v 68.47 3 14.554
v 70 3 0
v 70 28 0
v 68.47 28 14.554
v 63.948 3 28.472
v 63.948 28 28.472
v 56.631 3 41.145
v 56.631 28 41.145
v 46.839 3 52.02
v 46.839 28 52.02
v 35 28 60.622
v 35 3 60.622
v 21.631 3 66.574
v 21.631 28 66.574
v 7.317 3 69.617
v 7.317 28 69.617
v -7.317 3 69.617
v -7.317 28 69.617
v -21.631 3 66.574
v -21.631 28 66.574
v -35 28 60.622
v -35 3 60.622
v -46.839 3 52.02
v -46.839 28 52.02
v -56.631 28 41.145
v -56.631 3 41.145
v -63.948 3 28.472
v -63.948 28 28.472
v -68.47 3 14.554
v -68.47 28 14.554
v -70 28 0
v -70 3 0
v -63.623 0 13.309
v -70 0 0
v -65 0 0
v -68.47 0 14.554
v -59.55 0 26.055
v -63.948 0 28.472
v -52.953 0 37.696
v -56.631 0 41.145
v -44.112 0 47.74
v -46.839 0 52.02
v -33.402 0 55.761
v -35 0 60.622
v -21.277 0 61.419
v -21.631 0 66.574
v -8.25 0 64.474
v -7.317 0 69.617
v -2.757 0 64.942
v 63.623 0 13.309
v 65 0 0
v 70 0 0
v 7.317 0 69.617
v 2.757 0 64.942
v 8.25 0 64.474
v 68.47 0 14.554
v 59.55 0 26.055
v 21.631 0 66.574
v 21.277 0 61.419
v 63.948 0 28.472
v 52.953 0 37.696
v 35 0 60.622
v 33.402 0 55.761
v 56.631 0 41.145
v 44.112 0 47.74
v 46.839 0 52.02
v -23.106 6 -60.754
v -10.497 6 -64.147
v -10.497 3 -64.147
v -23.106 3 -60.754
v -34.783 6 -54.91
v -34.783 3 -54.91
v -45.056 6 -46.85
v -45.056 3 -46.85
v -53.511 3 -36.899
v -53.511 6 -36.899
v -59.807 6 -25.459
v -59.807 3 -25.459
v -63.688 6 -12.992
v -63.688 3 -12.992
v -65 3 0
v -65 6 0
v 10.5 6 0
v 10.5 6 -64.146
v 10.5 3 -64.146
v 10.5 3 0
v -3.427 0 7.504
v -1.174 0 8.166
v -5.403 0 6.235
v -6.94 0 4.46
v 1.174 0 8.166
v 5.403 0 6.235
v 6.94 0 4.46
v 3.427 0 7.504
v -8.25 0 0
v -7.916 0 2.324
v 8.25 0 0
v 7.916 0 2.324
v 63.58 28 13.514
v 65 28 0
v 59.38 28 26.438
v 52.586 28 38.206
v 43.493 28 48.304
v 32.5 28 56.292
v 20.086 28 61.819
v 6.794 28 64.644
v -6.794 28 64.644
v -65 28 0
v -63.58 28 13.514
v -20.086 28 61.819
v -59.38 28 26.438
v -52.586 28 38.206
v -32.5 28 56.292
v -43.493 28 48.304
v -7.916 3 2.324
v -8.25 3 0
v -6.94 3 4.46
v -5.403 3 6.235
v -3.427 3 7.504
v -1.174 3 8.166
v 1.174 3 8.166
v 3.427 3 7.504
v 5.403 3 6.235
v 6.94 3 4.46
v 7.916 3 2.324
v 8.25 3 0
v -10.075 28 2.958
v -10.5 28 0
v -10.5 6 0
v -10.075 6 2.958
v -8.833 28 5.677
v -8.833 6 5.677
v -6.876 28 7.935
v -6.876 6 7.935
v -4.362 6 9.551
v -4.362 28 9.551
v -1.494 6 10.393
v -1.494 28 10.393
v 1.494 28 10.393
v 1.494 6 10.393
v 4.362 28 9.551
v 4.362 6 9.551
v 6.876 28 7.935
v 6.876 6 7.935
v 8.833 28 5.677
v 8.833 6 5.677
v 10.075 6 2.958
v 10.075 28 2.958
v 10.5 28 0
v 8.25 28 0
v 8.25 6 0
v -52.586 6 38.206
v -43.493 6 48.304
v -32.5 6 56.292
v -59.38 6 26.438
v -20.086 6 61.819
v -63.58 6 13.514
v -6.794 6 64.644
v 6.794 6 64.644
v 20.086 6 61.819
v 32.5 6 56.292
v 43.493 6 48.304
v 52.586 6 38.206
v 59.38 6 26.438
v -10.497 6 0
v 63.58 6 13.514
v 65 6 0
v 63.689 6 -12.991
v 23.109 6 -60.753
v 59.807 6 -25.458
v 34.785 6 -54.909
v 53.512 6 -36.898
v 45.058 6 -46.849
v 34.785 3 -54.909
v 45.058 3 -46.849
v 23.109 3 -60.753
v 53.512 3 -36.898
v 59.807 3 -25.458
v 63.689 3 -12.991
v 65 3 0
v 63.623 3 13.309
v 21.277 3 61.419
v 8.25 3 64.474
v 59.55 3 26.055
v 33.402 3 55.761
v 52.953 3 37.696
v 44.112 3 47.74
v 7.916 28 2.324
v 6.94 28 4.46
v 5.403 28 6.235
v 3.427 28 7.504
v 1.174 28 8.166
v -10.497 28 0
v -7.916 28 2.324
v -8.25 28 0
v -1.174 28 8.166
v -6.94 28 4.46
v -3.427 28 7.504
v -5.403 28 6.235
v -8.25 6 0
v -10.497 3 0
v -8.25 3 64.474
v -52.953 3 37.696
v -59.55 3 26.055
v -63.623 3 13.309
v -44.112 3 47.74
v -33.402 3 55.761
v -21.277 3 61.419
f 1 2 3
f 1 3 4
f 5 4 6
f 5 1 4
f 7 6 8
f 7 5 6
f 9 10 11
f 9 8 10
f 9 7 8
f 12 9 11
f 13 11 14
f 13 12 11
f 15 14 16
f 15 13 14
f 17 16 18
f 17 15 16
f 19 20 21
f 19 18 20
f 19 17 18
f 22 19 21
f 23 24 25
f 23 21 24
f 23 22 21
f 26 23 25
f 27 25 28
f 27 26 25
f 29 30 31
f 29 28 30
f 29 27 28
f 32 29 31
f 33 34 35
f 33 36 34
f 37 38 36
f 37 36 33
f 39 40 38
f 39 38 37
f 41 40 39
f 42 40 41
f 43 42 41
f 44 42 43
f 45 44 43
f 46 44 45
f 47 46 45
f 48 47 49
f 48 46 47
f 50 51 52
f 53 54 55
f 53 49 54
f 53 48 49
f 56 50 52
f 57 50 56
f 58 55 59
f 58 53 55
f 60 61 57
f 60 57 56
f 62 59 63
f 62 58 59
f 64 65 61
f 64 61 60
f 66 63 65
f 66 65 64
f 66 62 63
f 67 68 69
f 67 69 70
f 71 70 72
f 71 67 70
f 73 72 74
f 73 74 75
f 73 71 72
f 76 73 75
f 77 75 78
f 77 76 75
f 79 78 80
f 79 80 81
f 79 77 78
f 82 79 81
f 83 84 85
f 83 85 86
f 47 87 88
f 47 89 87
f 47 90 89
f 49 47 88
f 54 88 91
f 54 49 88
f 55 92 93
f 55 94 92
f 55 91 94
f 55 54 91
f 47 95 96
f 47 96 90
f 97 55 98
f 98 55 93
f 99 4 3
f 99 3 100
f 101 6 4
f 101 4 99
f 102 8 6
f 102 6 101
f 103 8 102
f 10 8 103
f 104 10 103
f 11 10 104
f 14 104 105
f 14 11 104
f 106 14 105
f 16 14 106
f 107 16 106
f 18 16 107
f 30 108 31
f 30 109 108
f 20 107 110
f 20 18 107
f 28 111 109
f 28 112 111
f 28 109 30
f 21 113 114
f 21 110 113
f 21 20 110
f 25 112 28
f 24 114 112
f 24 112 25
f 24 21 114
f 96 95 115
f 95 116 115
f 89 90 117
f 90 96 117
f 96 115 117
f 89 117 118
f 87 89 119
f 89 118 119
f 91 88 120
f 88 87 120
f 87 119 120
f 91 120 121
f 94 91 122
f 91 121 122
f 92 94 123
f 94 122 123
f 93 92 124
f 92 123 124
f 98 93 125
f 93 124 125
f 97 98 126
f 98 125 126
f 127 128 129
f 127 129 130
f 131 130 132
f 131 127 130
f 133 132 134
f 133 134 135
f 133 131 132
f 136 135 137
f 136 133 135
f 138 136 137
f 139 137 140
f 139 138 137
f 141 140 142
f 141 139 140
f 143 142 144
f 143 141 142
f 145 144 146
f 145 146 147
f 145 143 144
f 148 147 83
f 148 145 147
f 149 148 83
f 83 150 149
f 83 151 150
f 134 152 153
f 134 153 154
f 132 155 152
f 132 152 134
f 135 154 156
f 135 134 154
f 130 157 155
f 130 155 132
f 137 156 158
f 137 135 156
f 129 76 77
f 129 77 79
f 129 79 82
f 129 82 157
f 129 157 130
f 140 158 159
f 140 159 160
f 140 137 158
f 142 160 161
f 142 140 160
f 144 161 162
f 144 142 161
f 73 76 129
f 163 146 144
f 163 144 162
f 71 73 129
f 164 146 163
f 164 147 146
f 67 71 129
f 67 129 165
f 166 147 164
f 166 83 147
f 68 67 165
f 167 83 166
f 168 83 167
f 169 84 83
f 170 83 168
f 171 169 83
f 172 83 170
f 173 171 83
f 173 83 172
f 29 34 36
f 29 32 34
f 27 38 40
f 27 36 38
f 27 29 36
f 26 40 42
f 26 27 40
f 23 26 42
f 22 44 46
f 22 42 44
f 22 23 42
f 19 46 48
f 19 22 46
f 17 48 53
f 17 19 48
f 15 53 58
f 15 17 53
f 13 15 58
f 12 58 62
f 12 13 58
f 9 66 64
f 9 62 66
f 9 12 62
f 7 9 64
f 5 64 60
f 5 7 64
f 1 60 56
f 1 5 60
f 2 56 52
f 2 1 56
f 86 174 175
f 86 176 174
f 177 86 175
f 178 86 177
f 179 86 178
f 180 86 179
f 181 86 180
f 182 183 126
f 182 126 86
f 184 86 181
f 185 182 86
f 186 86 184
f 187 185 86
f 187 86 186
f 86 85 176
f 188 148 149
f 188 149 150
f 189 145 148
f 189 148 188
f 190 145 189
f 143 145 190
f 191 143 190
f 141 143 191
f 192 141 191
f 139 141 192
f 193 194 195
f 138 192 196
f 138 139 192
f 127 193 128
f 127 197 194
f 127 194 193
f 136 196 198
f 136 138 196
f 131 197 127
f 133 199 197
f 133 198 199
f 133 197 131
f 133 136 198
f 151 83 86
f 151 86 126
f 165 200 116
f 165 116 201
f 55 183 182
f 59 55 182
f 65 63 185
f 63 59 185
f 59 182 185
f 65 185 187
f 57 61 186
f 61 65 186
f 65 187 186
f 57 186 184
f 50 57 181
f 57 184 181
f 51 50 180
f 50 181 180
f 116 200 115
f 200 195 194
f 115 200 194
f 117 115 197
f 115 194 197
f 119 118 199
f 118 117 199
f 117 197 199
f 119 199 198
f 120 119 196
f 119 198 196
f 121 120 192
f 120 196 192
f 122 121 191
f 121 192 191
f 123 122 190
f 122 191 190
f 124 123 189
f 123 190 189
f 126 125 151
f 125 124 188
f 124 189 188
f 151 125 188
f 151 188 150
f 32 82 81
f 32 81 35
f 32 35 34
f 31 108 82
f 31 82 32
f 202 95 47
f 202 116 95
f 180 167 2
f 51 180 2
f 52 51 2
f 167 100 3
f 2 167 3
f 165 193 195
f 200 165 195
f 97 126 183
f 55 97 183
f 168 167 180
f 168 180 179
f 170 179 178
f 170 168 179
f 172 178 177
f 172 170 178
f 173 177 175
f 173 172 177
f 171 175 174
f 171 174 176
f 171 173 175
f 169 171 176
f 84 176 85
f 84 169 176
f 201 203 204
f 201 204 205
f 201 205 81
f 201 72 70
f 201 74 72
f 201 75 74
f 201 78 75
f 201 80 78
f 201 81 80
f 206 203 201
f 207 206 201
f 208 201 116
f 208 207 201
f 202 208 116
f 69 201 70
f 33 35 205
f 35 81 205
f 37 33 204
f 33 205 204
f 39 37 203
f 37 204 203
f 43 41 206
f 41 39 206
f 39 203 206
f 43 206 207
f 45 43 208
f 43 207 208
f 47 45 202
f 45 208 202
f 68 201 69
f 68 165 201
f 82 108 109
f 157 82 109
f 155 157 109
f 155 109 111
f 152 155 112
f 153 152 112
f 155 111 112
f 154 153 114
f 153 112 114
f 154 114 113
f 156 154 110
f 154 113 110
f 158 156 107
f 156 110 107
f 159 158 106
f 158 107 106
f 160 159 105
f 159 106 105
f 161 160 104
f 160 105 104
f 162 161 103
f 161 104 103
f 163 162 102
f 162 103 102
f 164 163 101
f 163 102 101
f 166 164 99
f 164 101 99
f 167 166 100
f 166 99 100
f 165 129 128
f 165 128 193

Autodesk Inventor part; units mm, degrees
ref_plane "YZ Plane" through (0, 0, 0) normal (1, 0, 0) x (0, 1, 0)
ref_plane "XZ Plane" through (0, 0, 0) normal (0, 1, 0) x (-1, 0, 0)
ref_plane "XY Plane" through (0, 0, 0) normal (0, 0, 1) x (1, 0, 0)
sketch "Sketch1" plane through (0, 0, 0) normal (0, 1, 0) x (-1, 0, 0)
  circle A0 centre (0, 0) radius 70
  dimension "d0" = 140
extrude "Extrusion1" add sketch "Sketch1" along normal blind 28
sketch "Sketch2" plane through (0, 28, 0) normal (0, 1, 0) x (1, 0, 0)
  circle A0 centre (0, 0) radius 8.25
  dimension "d3" = 16.5
extrude "Extrusion2" cut sketch "Sketch2" against normal blind 280
sketch "Sketch3" plane through (0, 28, 0) normal (0, 1, 0) x (1, 0, 0)
  circle A0 centre (0, 0) radius 8.25 projected
  circle A1 centre (0, 0) radius 65
  circle A2 centre (0, 0) radius 10.5
  dimension "d6" = 130
  dimension "d7" = 21
extrude "Extrusion3" cut sketch "Sketch3" against normal blind 22 contours A1
sketch "Sketch4" plane through (0, 6, 0) normal (0, 1, 0) x (1, 0, 0)
  line L0 (-77.4845, 0) -> (88.5537, 0)
  line L1 (88.5537, 0) -> (88.5537, 100.8261)
  line L2 (88.5537, 100.8261) -> (-77.4845, 100.8261)
  line L3 (-77.4845, 100.8261) -> (-77.4845, 0)
  point P0 (0, 0)
extrude "Extrusion4" cut sketch "Sketch4" along normal blind 220
sketch "Sketch5" plane through (0, 0, 0) normal (0, -1, 0) x (1, 0, 0)
  circle A0 centre (0, 0) radius 8.25 projected
  circle A1 centre (0, 0) radius 70
extrude "Extrusion5" cut sketch "Sketch5" against normal blind 3
sketch "Sketch6" plane through (0, 6, 0) normal (0, 1, 0) x (1, 0, 0)
  arc A0 (-65, 0) -> (65, 0) centre (0, 0) ccw projected
  line L0 (65, 0) -> (70, 0) projected
  arc A1 (70, 0) -> (-70, 0) centre (0, 0) ccw projected
  line L1 (-70, 0) -> (-65, 0) projected
  arc A2 (-10.5, 0) -> (10.5, 0) centre (0, 0) ccw projected
  line L2 (-10.5, 0) -> (-8.25, 0) projected
  arc A3 (8.25, 0) -> (-8.25, 0) centre (0, 0) ccw projected
  line L3 (8.25, 0) -> (10.5, 0) projected
  circle A4 centre (0, 0) radius 8.25 projected
  arc A5 (65, 0) -> (-65, 0) centre (0, 0) ccw
  line L4 (-65, 0) -> (-70, 0)
  line L5 (65, 0) -> (70, 0)
  arc A6 (70, 0) -> (-70, 0) centre (0, 0) ccw projected
  arc A7 (70, 0) -> (70, 0) centre (0, 0) ccw
extrude "Extrusion6" cut sketch "Sketch6" against normal blind 3 contours L1 A1 L0 A5
sketch "Sketch7" plane through (0, 3, 0) normal (0, -1, 0) x (1, 0, 0)
  point P0 (0, 0)
sketch "Sketch8" plane through (0, 3, 0) normal (0, -1, 0) x (1, 0, 0)
  arc A0 (65, 0) -> (-65, 0) centre (0, 0) ccw projected
  arc A1 (70, 0) -> (-70, 0) centre (0, 0) ccw projected
  arc A2 (70, 0) -> (-70, 0) centre (0, 0) ccw
  arc A3 (65, 0) -> (-65, 0) centre (0, 0) ccw
  line L0 (65, 0) -> (70, 0) projected
  line L1 (70, 0) -> (65, 0)
  line L2 (-65, 0) -> (-70, 0) projected
  line L3 (-65, 0) -> (-70, 0)
extrude "Extrusion7" add sketch "Sketch8" along normal blind 3
sketch "Sketch9" plane through (0, 28, 0) normal (0, 1, 0) x (1, 0, 0)
  line L0 (10.5, 0) -> (-10.497, 0)
  line L1 (-10.497, 0) -> (-10.497, 68.6752)
  line L2 (-10.497, 68.6752) -> (10.5, 68.6752)
  line L3 (10.5, 68.6752) -> (10.5, 0)
  point P0 (0, 0)
extrude "Extrusion8" cut sketch "Sketch9" against normal blind 30
sketch "Sketch10" plane through (0, 3, 0) normal (0, -1, 0) x (1, 0, 0)
  arc A0 (8.25, 0) -> (-8.25, 0) centre (0, 0) ccw projected
  arc A1 (8.25, 0) -> (-8.25, 0) centre (0, 0) ccw
  line L0 (8.25, 0) -> (8.25, 64.4743)
  arc A2 (65, 0) -> (-65, 0) centre (0, 0) ccw projected
  line L1 (-8.25, 0) -> (-8.25, 64.4743)
  arc A3 (8.25, 64.4743) -> (-8.25, 64.4743) centre (0, 0) ccw
  point P0 (8.2498, 0.0514)
extrude "Extrusion9" add sketch "Sketch10" along normal blind 3
properties part number "casept1" material "PC/ABS Plastic"
